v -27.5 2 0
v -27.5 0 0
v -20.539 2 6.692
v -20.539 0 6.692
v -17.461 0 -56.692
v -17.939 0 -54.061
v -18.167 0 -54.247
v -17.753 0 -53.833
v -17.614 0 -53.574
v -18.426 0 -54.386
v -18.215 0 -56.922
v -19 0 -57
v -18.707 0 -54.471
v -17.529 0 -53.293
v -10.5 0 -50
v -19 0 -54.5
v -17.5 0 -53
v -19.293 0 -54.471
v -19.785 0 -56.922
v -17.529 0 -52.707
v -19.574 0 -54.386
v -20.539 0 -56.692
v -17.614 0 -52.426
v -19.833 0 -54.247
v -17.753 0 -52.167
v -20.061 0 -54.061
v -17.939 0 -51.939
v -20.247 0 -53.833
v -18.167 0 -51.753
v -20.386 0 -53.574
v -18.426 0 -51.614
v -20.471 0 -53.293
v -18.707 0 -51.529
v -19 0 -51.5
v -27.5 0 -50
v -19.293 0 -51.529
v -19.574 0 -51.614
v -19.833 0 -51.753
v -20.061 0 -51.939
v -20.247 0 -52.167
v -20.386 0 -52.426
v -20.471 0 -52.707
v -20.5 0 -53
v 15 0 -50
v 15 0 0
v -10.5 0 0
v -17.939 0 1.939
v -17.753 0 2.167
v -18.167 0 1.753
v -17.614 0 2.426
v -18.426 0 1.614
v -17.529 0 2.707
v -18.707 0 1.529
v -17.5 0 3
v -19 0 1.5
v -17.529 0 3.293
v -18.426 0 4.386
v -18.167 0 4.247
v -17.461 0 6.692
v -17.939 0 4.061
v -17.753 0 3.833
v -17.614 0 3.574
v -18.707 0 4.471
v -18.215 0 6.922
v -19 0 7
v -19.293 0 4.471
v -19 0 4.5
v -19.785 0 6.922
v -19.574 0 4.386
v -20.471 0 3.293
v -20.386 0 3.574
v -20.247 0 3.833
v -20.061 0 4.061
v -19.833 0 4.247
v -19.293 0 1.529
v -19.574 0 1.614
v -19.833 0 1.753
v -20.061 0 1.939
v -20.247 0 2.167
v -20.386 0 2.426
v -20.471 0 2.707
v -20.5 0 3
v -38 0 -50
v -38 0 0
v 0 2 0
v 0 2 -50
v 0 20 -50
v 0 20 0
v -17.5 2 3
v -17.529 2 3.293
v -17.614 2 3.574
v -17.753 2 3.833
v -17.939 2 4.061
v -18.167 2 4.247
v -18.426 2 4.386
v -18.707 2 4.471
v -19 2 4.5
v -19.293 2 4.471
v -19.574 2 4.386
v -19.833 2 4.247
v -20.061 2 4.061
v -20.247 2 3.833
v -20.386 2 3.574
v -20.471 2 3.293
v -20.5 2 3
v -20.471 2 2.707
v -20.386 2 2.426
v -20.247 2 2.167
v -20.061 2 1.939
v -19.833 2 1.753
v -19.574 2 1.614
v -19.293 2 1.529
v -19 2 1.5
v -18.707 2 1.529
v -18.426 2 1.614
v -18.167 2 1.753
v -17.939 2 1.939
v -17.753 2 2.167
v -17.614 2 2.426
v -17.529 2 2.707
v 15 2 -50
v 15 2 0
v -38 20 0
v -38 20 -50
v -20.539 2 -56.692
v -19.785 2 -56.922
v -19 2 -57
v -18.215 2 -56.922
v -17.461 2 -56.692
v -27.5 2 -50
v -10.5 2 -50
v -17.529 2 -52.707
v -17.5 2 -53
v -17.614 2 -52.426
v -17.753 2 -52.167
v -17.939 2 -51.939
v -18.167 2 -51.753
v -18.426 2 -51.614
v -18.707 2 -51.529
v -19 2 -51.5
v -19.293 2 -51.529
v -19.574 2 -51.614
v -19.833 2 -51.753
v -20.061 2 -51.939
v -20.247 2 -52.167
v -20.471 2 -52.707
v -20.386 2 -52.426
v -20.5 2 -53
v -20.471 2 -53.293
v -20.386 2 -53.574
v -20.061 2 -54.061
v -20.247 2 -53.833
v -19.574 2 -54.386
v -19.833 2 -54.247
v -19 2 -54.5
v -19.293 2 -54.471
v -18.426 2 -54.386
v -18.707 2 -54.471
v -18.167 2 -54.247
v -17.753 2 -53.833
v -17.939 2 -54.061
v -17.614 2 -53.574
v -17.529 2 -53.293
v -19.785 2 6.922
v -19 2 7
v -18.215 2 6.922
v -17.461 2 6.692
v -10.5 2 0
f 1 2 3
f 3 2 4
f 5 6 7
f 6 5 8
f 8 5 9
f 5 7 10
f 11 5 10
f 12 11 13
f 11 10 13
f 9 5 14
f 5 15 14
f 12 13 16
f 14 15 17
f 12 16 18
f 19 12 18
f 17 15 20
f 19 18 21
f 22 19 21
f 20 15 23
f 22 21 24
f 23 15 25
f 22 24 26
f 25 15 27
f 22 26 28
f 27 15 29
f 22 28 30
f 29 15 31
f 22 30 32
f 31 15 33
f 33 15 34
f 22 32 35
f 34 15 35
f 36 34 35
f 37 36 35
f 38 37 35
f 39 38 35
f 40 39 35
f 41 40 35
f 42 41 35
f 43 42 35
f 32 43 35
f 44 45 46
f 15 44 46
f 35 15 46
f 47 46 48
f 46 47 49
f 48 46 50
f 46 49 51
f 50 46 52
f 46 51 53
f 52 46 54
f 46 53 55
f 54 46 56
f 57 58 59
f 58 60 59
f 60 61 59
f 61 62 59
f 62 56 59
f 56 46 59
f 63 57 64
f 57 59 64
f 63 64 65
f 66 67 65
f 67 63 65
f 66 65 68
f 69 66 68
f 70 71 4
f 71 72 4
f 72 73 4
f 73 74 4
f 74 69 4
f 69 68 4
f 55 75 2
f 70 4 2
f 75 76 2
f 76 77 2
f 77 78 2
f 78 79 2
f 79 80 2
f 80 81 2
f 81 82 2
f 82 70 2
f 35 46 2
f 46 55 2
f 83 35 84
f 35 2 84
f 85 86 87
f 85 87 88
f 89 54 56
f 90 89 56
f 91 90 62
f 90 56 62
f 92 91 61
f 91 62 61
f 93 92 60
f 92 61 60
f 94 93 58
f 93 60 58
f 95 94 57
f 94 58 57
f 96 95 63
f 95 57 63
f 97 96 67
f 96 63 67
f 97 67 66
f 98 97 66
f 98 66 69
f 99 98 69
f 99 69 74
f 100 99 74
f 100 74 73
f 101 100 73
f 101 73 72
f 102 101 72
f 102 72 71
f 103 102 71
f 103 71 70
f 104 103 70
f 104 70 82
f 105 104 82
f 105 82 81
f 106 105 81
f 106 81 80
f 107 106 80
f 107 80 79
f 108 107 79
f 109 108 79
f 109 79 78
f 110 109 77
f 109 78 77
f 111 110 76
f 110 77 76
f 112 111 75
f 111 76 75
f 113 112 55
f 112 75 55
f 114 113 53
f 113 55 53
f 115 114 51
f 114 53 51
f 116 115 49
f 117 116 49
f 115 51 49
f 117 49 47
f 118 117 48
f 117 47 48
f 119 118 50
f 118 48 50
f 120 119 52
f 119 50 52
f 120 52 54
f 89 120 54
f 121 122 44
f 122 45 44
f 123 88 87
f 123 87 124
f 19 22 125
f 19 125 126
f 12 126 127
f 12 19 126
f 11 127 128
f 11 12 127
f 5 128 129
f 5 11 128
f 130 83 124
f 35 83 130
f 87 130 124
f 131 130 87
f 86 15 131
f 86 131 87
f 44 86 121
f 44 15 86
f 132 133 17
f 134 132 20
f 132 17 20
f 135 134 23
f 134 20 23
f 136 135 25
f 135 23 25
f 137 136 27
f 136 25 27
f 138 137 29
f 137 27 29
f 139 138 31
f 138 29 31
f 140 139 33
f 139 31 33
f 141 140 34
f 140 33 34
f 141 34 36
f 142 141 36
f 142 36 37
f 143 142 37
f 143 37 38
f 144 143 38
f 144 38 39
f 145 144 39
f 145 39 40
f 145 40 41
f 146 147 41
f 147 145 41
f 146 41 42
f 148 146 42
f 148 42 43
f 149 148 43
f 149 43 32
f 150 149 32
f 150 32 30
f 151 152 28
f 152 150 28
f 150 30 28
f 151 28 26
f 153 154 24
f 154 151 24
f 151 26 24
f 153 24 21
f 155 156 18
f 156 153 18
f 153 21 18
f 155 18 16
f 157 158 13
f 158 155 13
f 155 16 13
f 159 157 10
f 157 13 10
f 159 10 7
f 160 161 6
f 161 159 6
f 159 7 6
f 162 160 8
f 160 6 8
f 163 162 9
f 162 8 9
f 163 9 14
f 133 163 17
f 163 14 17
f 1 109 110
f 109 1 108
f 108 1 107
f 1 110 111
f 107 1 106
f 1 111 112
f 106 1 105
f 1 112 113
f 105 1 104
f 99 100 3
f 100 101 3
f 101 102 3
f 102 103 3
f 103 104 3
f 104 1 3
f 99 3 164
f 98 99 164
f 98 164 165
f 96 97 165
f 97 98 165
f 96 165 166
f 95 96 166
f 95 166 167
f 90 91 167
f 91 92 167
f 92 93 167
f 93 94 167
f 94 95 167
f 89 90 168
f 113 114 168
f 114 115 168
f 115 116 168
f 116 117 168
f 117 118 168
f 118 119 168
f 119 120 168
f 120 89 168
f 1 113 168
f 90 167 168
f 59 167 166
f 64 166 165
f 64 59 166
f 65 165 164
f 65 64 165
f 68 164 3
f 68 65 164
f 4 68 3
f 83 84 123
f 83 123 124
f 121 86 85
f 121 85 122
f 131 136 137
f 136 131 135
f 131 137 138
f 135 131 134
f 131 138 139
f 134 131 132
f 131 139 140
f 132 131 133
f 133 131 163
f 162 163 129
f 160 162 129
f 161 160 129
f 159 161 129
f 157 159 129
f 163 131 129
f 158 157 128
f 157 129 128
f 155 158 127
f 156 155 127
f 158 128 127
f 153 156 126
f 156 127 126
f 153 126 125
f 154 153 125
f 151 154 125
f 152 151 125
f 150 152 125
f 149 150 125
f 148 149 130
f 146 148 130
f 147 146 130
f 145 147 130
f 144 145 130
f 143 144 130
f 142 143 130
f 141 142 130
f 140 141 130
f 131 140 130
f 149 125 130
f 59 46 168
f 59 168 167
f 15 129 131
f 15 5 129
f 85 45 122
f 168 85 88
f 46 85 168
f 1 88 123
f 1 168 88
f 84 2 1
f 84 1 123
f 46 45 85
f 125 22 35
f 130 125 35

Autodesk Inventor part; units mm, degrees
ref_plane "YZ Plane" through (0, 0, 0) normal (1, 0, 0) x (0, 1, 0)
ref_plane "XZ Plane" through (0, 0, 0) normal (0, 1, 0) x (-1, 0, 0)
sketch "Sketch1" plane through (0, 0, 0) normal (0, 1, 0) x (-1, 0, 0)
  line L0 (0, 0) -> (38, 0)
  line L1 (38, 0) -> (38, -50)
  line L2 (38, -50) -> (0, -50)
  line L3 (0, -50) -> (0, 0)
  dimension "d0" = 38
  dimension "d1" = 50
extrude "Extrusion1" add sketch "Sketch1" along normal blind 20
sketch "Sketch2" plane through (0, 0, 0) normal (0, -1, 0) x (1, 0, 0)
  line L0 (0, 0) -> (0, -50) projected
  line L1 (0, 0) -> (15, 0)
  line L2 (15, 0) -> (15, -50)
  line L3 (15, -50) -> (0, -50)
  line L4 (0, -50) -> (0, 0)
  dimension "d4" = 15
  dimension "d5" = 50
extrude "Extrusion2" add sketch "Sketch2" against normal blind 2
sketch "Sketch3" plane through (0, 0, 0) normal (0, -1, 0) x (1, 0, 0)
  line L0 (-38, 0) -> (0, 0) projected
  line L1 (-19, 0) -> (-19, 7)
  line L2 (-19, 0) -> (-19, 3)
  line L3 (-19, 0) -> (-10.5, 0)
  line L4 (-19, 0) -> (-27.5, 0)
  circle A0 centre (-19, 3) radius 1.5
  circle A1 centre (-19, 3) radius 4
  line L5 (-10.5, 0) -> (-17.4608, 6.692)
  line L6 (-27.5, 0) -> (-20.5392, 6.692)
  dimension "d10" = 8.5
  dimension "d11" = 8.5
  dimension "d12" = 3
  dimension "d18" = 3
  dimension "d19" = 8
extrude "Extrusion3" add sketch "Sketch3" against normal blind 2 contours L6 A1 L0 | A1 L6 L1 A0 L0 | L1 A0 A1 L5 L0 | A1 L5 L0
ref_plane "Work Plane1" through (-38, 20, -25) normal (0, 0, 1) x (1, 0, 0)
mirror "Mirror1" about plane through (-38, 20, -25) normal (0, 0, 1) of "Extrusion3"
properties part number "25W_1224_5V"
